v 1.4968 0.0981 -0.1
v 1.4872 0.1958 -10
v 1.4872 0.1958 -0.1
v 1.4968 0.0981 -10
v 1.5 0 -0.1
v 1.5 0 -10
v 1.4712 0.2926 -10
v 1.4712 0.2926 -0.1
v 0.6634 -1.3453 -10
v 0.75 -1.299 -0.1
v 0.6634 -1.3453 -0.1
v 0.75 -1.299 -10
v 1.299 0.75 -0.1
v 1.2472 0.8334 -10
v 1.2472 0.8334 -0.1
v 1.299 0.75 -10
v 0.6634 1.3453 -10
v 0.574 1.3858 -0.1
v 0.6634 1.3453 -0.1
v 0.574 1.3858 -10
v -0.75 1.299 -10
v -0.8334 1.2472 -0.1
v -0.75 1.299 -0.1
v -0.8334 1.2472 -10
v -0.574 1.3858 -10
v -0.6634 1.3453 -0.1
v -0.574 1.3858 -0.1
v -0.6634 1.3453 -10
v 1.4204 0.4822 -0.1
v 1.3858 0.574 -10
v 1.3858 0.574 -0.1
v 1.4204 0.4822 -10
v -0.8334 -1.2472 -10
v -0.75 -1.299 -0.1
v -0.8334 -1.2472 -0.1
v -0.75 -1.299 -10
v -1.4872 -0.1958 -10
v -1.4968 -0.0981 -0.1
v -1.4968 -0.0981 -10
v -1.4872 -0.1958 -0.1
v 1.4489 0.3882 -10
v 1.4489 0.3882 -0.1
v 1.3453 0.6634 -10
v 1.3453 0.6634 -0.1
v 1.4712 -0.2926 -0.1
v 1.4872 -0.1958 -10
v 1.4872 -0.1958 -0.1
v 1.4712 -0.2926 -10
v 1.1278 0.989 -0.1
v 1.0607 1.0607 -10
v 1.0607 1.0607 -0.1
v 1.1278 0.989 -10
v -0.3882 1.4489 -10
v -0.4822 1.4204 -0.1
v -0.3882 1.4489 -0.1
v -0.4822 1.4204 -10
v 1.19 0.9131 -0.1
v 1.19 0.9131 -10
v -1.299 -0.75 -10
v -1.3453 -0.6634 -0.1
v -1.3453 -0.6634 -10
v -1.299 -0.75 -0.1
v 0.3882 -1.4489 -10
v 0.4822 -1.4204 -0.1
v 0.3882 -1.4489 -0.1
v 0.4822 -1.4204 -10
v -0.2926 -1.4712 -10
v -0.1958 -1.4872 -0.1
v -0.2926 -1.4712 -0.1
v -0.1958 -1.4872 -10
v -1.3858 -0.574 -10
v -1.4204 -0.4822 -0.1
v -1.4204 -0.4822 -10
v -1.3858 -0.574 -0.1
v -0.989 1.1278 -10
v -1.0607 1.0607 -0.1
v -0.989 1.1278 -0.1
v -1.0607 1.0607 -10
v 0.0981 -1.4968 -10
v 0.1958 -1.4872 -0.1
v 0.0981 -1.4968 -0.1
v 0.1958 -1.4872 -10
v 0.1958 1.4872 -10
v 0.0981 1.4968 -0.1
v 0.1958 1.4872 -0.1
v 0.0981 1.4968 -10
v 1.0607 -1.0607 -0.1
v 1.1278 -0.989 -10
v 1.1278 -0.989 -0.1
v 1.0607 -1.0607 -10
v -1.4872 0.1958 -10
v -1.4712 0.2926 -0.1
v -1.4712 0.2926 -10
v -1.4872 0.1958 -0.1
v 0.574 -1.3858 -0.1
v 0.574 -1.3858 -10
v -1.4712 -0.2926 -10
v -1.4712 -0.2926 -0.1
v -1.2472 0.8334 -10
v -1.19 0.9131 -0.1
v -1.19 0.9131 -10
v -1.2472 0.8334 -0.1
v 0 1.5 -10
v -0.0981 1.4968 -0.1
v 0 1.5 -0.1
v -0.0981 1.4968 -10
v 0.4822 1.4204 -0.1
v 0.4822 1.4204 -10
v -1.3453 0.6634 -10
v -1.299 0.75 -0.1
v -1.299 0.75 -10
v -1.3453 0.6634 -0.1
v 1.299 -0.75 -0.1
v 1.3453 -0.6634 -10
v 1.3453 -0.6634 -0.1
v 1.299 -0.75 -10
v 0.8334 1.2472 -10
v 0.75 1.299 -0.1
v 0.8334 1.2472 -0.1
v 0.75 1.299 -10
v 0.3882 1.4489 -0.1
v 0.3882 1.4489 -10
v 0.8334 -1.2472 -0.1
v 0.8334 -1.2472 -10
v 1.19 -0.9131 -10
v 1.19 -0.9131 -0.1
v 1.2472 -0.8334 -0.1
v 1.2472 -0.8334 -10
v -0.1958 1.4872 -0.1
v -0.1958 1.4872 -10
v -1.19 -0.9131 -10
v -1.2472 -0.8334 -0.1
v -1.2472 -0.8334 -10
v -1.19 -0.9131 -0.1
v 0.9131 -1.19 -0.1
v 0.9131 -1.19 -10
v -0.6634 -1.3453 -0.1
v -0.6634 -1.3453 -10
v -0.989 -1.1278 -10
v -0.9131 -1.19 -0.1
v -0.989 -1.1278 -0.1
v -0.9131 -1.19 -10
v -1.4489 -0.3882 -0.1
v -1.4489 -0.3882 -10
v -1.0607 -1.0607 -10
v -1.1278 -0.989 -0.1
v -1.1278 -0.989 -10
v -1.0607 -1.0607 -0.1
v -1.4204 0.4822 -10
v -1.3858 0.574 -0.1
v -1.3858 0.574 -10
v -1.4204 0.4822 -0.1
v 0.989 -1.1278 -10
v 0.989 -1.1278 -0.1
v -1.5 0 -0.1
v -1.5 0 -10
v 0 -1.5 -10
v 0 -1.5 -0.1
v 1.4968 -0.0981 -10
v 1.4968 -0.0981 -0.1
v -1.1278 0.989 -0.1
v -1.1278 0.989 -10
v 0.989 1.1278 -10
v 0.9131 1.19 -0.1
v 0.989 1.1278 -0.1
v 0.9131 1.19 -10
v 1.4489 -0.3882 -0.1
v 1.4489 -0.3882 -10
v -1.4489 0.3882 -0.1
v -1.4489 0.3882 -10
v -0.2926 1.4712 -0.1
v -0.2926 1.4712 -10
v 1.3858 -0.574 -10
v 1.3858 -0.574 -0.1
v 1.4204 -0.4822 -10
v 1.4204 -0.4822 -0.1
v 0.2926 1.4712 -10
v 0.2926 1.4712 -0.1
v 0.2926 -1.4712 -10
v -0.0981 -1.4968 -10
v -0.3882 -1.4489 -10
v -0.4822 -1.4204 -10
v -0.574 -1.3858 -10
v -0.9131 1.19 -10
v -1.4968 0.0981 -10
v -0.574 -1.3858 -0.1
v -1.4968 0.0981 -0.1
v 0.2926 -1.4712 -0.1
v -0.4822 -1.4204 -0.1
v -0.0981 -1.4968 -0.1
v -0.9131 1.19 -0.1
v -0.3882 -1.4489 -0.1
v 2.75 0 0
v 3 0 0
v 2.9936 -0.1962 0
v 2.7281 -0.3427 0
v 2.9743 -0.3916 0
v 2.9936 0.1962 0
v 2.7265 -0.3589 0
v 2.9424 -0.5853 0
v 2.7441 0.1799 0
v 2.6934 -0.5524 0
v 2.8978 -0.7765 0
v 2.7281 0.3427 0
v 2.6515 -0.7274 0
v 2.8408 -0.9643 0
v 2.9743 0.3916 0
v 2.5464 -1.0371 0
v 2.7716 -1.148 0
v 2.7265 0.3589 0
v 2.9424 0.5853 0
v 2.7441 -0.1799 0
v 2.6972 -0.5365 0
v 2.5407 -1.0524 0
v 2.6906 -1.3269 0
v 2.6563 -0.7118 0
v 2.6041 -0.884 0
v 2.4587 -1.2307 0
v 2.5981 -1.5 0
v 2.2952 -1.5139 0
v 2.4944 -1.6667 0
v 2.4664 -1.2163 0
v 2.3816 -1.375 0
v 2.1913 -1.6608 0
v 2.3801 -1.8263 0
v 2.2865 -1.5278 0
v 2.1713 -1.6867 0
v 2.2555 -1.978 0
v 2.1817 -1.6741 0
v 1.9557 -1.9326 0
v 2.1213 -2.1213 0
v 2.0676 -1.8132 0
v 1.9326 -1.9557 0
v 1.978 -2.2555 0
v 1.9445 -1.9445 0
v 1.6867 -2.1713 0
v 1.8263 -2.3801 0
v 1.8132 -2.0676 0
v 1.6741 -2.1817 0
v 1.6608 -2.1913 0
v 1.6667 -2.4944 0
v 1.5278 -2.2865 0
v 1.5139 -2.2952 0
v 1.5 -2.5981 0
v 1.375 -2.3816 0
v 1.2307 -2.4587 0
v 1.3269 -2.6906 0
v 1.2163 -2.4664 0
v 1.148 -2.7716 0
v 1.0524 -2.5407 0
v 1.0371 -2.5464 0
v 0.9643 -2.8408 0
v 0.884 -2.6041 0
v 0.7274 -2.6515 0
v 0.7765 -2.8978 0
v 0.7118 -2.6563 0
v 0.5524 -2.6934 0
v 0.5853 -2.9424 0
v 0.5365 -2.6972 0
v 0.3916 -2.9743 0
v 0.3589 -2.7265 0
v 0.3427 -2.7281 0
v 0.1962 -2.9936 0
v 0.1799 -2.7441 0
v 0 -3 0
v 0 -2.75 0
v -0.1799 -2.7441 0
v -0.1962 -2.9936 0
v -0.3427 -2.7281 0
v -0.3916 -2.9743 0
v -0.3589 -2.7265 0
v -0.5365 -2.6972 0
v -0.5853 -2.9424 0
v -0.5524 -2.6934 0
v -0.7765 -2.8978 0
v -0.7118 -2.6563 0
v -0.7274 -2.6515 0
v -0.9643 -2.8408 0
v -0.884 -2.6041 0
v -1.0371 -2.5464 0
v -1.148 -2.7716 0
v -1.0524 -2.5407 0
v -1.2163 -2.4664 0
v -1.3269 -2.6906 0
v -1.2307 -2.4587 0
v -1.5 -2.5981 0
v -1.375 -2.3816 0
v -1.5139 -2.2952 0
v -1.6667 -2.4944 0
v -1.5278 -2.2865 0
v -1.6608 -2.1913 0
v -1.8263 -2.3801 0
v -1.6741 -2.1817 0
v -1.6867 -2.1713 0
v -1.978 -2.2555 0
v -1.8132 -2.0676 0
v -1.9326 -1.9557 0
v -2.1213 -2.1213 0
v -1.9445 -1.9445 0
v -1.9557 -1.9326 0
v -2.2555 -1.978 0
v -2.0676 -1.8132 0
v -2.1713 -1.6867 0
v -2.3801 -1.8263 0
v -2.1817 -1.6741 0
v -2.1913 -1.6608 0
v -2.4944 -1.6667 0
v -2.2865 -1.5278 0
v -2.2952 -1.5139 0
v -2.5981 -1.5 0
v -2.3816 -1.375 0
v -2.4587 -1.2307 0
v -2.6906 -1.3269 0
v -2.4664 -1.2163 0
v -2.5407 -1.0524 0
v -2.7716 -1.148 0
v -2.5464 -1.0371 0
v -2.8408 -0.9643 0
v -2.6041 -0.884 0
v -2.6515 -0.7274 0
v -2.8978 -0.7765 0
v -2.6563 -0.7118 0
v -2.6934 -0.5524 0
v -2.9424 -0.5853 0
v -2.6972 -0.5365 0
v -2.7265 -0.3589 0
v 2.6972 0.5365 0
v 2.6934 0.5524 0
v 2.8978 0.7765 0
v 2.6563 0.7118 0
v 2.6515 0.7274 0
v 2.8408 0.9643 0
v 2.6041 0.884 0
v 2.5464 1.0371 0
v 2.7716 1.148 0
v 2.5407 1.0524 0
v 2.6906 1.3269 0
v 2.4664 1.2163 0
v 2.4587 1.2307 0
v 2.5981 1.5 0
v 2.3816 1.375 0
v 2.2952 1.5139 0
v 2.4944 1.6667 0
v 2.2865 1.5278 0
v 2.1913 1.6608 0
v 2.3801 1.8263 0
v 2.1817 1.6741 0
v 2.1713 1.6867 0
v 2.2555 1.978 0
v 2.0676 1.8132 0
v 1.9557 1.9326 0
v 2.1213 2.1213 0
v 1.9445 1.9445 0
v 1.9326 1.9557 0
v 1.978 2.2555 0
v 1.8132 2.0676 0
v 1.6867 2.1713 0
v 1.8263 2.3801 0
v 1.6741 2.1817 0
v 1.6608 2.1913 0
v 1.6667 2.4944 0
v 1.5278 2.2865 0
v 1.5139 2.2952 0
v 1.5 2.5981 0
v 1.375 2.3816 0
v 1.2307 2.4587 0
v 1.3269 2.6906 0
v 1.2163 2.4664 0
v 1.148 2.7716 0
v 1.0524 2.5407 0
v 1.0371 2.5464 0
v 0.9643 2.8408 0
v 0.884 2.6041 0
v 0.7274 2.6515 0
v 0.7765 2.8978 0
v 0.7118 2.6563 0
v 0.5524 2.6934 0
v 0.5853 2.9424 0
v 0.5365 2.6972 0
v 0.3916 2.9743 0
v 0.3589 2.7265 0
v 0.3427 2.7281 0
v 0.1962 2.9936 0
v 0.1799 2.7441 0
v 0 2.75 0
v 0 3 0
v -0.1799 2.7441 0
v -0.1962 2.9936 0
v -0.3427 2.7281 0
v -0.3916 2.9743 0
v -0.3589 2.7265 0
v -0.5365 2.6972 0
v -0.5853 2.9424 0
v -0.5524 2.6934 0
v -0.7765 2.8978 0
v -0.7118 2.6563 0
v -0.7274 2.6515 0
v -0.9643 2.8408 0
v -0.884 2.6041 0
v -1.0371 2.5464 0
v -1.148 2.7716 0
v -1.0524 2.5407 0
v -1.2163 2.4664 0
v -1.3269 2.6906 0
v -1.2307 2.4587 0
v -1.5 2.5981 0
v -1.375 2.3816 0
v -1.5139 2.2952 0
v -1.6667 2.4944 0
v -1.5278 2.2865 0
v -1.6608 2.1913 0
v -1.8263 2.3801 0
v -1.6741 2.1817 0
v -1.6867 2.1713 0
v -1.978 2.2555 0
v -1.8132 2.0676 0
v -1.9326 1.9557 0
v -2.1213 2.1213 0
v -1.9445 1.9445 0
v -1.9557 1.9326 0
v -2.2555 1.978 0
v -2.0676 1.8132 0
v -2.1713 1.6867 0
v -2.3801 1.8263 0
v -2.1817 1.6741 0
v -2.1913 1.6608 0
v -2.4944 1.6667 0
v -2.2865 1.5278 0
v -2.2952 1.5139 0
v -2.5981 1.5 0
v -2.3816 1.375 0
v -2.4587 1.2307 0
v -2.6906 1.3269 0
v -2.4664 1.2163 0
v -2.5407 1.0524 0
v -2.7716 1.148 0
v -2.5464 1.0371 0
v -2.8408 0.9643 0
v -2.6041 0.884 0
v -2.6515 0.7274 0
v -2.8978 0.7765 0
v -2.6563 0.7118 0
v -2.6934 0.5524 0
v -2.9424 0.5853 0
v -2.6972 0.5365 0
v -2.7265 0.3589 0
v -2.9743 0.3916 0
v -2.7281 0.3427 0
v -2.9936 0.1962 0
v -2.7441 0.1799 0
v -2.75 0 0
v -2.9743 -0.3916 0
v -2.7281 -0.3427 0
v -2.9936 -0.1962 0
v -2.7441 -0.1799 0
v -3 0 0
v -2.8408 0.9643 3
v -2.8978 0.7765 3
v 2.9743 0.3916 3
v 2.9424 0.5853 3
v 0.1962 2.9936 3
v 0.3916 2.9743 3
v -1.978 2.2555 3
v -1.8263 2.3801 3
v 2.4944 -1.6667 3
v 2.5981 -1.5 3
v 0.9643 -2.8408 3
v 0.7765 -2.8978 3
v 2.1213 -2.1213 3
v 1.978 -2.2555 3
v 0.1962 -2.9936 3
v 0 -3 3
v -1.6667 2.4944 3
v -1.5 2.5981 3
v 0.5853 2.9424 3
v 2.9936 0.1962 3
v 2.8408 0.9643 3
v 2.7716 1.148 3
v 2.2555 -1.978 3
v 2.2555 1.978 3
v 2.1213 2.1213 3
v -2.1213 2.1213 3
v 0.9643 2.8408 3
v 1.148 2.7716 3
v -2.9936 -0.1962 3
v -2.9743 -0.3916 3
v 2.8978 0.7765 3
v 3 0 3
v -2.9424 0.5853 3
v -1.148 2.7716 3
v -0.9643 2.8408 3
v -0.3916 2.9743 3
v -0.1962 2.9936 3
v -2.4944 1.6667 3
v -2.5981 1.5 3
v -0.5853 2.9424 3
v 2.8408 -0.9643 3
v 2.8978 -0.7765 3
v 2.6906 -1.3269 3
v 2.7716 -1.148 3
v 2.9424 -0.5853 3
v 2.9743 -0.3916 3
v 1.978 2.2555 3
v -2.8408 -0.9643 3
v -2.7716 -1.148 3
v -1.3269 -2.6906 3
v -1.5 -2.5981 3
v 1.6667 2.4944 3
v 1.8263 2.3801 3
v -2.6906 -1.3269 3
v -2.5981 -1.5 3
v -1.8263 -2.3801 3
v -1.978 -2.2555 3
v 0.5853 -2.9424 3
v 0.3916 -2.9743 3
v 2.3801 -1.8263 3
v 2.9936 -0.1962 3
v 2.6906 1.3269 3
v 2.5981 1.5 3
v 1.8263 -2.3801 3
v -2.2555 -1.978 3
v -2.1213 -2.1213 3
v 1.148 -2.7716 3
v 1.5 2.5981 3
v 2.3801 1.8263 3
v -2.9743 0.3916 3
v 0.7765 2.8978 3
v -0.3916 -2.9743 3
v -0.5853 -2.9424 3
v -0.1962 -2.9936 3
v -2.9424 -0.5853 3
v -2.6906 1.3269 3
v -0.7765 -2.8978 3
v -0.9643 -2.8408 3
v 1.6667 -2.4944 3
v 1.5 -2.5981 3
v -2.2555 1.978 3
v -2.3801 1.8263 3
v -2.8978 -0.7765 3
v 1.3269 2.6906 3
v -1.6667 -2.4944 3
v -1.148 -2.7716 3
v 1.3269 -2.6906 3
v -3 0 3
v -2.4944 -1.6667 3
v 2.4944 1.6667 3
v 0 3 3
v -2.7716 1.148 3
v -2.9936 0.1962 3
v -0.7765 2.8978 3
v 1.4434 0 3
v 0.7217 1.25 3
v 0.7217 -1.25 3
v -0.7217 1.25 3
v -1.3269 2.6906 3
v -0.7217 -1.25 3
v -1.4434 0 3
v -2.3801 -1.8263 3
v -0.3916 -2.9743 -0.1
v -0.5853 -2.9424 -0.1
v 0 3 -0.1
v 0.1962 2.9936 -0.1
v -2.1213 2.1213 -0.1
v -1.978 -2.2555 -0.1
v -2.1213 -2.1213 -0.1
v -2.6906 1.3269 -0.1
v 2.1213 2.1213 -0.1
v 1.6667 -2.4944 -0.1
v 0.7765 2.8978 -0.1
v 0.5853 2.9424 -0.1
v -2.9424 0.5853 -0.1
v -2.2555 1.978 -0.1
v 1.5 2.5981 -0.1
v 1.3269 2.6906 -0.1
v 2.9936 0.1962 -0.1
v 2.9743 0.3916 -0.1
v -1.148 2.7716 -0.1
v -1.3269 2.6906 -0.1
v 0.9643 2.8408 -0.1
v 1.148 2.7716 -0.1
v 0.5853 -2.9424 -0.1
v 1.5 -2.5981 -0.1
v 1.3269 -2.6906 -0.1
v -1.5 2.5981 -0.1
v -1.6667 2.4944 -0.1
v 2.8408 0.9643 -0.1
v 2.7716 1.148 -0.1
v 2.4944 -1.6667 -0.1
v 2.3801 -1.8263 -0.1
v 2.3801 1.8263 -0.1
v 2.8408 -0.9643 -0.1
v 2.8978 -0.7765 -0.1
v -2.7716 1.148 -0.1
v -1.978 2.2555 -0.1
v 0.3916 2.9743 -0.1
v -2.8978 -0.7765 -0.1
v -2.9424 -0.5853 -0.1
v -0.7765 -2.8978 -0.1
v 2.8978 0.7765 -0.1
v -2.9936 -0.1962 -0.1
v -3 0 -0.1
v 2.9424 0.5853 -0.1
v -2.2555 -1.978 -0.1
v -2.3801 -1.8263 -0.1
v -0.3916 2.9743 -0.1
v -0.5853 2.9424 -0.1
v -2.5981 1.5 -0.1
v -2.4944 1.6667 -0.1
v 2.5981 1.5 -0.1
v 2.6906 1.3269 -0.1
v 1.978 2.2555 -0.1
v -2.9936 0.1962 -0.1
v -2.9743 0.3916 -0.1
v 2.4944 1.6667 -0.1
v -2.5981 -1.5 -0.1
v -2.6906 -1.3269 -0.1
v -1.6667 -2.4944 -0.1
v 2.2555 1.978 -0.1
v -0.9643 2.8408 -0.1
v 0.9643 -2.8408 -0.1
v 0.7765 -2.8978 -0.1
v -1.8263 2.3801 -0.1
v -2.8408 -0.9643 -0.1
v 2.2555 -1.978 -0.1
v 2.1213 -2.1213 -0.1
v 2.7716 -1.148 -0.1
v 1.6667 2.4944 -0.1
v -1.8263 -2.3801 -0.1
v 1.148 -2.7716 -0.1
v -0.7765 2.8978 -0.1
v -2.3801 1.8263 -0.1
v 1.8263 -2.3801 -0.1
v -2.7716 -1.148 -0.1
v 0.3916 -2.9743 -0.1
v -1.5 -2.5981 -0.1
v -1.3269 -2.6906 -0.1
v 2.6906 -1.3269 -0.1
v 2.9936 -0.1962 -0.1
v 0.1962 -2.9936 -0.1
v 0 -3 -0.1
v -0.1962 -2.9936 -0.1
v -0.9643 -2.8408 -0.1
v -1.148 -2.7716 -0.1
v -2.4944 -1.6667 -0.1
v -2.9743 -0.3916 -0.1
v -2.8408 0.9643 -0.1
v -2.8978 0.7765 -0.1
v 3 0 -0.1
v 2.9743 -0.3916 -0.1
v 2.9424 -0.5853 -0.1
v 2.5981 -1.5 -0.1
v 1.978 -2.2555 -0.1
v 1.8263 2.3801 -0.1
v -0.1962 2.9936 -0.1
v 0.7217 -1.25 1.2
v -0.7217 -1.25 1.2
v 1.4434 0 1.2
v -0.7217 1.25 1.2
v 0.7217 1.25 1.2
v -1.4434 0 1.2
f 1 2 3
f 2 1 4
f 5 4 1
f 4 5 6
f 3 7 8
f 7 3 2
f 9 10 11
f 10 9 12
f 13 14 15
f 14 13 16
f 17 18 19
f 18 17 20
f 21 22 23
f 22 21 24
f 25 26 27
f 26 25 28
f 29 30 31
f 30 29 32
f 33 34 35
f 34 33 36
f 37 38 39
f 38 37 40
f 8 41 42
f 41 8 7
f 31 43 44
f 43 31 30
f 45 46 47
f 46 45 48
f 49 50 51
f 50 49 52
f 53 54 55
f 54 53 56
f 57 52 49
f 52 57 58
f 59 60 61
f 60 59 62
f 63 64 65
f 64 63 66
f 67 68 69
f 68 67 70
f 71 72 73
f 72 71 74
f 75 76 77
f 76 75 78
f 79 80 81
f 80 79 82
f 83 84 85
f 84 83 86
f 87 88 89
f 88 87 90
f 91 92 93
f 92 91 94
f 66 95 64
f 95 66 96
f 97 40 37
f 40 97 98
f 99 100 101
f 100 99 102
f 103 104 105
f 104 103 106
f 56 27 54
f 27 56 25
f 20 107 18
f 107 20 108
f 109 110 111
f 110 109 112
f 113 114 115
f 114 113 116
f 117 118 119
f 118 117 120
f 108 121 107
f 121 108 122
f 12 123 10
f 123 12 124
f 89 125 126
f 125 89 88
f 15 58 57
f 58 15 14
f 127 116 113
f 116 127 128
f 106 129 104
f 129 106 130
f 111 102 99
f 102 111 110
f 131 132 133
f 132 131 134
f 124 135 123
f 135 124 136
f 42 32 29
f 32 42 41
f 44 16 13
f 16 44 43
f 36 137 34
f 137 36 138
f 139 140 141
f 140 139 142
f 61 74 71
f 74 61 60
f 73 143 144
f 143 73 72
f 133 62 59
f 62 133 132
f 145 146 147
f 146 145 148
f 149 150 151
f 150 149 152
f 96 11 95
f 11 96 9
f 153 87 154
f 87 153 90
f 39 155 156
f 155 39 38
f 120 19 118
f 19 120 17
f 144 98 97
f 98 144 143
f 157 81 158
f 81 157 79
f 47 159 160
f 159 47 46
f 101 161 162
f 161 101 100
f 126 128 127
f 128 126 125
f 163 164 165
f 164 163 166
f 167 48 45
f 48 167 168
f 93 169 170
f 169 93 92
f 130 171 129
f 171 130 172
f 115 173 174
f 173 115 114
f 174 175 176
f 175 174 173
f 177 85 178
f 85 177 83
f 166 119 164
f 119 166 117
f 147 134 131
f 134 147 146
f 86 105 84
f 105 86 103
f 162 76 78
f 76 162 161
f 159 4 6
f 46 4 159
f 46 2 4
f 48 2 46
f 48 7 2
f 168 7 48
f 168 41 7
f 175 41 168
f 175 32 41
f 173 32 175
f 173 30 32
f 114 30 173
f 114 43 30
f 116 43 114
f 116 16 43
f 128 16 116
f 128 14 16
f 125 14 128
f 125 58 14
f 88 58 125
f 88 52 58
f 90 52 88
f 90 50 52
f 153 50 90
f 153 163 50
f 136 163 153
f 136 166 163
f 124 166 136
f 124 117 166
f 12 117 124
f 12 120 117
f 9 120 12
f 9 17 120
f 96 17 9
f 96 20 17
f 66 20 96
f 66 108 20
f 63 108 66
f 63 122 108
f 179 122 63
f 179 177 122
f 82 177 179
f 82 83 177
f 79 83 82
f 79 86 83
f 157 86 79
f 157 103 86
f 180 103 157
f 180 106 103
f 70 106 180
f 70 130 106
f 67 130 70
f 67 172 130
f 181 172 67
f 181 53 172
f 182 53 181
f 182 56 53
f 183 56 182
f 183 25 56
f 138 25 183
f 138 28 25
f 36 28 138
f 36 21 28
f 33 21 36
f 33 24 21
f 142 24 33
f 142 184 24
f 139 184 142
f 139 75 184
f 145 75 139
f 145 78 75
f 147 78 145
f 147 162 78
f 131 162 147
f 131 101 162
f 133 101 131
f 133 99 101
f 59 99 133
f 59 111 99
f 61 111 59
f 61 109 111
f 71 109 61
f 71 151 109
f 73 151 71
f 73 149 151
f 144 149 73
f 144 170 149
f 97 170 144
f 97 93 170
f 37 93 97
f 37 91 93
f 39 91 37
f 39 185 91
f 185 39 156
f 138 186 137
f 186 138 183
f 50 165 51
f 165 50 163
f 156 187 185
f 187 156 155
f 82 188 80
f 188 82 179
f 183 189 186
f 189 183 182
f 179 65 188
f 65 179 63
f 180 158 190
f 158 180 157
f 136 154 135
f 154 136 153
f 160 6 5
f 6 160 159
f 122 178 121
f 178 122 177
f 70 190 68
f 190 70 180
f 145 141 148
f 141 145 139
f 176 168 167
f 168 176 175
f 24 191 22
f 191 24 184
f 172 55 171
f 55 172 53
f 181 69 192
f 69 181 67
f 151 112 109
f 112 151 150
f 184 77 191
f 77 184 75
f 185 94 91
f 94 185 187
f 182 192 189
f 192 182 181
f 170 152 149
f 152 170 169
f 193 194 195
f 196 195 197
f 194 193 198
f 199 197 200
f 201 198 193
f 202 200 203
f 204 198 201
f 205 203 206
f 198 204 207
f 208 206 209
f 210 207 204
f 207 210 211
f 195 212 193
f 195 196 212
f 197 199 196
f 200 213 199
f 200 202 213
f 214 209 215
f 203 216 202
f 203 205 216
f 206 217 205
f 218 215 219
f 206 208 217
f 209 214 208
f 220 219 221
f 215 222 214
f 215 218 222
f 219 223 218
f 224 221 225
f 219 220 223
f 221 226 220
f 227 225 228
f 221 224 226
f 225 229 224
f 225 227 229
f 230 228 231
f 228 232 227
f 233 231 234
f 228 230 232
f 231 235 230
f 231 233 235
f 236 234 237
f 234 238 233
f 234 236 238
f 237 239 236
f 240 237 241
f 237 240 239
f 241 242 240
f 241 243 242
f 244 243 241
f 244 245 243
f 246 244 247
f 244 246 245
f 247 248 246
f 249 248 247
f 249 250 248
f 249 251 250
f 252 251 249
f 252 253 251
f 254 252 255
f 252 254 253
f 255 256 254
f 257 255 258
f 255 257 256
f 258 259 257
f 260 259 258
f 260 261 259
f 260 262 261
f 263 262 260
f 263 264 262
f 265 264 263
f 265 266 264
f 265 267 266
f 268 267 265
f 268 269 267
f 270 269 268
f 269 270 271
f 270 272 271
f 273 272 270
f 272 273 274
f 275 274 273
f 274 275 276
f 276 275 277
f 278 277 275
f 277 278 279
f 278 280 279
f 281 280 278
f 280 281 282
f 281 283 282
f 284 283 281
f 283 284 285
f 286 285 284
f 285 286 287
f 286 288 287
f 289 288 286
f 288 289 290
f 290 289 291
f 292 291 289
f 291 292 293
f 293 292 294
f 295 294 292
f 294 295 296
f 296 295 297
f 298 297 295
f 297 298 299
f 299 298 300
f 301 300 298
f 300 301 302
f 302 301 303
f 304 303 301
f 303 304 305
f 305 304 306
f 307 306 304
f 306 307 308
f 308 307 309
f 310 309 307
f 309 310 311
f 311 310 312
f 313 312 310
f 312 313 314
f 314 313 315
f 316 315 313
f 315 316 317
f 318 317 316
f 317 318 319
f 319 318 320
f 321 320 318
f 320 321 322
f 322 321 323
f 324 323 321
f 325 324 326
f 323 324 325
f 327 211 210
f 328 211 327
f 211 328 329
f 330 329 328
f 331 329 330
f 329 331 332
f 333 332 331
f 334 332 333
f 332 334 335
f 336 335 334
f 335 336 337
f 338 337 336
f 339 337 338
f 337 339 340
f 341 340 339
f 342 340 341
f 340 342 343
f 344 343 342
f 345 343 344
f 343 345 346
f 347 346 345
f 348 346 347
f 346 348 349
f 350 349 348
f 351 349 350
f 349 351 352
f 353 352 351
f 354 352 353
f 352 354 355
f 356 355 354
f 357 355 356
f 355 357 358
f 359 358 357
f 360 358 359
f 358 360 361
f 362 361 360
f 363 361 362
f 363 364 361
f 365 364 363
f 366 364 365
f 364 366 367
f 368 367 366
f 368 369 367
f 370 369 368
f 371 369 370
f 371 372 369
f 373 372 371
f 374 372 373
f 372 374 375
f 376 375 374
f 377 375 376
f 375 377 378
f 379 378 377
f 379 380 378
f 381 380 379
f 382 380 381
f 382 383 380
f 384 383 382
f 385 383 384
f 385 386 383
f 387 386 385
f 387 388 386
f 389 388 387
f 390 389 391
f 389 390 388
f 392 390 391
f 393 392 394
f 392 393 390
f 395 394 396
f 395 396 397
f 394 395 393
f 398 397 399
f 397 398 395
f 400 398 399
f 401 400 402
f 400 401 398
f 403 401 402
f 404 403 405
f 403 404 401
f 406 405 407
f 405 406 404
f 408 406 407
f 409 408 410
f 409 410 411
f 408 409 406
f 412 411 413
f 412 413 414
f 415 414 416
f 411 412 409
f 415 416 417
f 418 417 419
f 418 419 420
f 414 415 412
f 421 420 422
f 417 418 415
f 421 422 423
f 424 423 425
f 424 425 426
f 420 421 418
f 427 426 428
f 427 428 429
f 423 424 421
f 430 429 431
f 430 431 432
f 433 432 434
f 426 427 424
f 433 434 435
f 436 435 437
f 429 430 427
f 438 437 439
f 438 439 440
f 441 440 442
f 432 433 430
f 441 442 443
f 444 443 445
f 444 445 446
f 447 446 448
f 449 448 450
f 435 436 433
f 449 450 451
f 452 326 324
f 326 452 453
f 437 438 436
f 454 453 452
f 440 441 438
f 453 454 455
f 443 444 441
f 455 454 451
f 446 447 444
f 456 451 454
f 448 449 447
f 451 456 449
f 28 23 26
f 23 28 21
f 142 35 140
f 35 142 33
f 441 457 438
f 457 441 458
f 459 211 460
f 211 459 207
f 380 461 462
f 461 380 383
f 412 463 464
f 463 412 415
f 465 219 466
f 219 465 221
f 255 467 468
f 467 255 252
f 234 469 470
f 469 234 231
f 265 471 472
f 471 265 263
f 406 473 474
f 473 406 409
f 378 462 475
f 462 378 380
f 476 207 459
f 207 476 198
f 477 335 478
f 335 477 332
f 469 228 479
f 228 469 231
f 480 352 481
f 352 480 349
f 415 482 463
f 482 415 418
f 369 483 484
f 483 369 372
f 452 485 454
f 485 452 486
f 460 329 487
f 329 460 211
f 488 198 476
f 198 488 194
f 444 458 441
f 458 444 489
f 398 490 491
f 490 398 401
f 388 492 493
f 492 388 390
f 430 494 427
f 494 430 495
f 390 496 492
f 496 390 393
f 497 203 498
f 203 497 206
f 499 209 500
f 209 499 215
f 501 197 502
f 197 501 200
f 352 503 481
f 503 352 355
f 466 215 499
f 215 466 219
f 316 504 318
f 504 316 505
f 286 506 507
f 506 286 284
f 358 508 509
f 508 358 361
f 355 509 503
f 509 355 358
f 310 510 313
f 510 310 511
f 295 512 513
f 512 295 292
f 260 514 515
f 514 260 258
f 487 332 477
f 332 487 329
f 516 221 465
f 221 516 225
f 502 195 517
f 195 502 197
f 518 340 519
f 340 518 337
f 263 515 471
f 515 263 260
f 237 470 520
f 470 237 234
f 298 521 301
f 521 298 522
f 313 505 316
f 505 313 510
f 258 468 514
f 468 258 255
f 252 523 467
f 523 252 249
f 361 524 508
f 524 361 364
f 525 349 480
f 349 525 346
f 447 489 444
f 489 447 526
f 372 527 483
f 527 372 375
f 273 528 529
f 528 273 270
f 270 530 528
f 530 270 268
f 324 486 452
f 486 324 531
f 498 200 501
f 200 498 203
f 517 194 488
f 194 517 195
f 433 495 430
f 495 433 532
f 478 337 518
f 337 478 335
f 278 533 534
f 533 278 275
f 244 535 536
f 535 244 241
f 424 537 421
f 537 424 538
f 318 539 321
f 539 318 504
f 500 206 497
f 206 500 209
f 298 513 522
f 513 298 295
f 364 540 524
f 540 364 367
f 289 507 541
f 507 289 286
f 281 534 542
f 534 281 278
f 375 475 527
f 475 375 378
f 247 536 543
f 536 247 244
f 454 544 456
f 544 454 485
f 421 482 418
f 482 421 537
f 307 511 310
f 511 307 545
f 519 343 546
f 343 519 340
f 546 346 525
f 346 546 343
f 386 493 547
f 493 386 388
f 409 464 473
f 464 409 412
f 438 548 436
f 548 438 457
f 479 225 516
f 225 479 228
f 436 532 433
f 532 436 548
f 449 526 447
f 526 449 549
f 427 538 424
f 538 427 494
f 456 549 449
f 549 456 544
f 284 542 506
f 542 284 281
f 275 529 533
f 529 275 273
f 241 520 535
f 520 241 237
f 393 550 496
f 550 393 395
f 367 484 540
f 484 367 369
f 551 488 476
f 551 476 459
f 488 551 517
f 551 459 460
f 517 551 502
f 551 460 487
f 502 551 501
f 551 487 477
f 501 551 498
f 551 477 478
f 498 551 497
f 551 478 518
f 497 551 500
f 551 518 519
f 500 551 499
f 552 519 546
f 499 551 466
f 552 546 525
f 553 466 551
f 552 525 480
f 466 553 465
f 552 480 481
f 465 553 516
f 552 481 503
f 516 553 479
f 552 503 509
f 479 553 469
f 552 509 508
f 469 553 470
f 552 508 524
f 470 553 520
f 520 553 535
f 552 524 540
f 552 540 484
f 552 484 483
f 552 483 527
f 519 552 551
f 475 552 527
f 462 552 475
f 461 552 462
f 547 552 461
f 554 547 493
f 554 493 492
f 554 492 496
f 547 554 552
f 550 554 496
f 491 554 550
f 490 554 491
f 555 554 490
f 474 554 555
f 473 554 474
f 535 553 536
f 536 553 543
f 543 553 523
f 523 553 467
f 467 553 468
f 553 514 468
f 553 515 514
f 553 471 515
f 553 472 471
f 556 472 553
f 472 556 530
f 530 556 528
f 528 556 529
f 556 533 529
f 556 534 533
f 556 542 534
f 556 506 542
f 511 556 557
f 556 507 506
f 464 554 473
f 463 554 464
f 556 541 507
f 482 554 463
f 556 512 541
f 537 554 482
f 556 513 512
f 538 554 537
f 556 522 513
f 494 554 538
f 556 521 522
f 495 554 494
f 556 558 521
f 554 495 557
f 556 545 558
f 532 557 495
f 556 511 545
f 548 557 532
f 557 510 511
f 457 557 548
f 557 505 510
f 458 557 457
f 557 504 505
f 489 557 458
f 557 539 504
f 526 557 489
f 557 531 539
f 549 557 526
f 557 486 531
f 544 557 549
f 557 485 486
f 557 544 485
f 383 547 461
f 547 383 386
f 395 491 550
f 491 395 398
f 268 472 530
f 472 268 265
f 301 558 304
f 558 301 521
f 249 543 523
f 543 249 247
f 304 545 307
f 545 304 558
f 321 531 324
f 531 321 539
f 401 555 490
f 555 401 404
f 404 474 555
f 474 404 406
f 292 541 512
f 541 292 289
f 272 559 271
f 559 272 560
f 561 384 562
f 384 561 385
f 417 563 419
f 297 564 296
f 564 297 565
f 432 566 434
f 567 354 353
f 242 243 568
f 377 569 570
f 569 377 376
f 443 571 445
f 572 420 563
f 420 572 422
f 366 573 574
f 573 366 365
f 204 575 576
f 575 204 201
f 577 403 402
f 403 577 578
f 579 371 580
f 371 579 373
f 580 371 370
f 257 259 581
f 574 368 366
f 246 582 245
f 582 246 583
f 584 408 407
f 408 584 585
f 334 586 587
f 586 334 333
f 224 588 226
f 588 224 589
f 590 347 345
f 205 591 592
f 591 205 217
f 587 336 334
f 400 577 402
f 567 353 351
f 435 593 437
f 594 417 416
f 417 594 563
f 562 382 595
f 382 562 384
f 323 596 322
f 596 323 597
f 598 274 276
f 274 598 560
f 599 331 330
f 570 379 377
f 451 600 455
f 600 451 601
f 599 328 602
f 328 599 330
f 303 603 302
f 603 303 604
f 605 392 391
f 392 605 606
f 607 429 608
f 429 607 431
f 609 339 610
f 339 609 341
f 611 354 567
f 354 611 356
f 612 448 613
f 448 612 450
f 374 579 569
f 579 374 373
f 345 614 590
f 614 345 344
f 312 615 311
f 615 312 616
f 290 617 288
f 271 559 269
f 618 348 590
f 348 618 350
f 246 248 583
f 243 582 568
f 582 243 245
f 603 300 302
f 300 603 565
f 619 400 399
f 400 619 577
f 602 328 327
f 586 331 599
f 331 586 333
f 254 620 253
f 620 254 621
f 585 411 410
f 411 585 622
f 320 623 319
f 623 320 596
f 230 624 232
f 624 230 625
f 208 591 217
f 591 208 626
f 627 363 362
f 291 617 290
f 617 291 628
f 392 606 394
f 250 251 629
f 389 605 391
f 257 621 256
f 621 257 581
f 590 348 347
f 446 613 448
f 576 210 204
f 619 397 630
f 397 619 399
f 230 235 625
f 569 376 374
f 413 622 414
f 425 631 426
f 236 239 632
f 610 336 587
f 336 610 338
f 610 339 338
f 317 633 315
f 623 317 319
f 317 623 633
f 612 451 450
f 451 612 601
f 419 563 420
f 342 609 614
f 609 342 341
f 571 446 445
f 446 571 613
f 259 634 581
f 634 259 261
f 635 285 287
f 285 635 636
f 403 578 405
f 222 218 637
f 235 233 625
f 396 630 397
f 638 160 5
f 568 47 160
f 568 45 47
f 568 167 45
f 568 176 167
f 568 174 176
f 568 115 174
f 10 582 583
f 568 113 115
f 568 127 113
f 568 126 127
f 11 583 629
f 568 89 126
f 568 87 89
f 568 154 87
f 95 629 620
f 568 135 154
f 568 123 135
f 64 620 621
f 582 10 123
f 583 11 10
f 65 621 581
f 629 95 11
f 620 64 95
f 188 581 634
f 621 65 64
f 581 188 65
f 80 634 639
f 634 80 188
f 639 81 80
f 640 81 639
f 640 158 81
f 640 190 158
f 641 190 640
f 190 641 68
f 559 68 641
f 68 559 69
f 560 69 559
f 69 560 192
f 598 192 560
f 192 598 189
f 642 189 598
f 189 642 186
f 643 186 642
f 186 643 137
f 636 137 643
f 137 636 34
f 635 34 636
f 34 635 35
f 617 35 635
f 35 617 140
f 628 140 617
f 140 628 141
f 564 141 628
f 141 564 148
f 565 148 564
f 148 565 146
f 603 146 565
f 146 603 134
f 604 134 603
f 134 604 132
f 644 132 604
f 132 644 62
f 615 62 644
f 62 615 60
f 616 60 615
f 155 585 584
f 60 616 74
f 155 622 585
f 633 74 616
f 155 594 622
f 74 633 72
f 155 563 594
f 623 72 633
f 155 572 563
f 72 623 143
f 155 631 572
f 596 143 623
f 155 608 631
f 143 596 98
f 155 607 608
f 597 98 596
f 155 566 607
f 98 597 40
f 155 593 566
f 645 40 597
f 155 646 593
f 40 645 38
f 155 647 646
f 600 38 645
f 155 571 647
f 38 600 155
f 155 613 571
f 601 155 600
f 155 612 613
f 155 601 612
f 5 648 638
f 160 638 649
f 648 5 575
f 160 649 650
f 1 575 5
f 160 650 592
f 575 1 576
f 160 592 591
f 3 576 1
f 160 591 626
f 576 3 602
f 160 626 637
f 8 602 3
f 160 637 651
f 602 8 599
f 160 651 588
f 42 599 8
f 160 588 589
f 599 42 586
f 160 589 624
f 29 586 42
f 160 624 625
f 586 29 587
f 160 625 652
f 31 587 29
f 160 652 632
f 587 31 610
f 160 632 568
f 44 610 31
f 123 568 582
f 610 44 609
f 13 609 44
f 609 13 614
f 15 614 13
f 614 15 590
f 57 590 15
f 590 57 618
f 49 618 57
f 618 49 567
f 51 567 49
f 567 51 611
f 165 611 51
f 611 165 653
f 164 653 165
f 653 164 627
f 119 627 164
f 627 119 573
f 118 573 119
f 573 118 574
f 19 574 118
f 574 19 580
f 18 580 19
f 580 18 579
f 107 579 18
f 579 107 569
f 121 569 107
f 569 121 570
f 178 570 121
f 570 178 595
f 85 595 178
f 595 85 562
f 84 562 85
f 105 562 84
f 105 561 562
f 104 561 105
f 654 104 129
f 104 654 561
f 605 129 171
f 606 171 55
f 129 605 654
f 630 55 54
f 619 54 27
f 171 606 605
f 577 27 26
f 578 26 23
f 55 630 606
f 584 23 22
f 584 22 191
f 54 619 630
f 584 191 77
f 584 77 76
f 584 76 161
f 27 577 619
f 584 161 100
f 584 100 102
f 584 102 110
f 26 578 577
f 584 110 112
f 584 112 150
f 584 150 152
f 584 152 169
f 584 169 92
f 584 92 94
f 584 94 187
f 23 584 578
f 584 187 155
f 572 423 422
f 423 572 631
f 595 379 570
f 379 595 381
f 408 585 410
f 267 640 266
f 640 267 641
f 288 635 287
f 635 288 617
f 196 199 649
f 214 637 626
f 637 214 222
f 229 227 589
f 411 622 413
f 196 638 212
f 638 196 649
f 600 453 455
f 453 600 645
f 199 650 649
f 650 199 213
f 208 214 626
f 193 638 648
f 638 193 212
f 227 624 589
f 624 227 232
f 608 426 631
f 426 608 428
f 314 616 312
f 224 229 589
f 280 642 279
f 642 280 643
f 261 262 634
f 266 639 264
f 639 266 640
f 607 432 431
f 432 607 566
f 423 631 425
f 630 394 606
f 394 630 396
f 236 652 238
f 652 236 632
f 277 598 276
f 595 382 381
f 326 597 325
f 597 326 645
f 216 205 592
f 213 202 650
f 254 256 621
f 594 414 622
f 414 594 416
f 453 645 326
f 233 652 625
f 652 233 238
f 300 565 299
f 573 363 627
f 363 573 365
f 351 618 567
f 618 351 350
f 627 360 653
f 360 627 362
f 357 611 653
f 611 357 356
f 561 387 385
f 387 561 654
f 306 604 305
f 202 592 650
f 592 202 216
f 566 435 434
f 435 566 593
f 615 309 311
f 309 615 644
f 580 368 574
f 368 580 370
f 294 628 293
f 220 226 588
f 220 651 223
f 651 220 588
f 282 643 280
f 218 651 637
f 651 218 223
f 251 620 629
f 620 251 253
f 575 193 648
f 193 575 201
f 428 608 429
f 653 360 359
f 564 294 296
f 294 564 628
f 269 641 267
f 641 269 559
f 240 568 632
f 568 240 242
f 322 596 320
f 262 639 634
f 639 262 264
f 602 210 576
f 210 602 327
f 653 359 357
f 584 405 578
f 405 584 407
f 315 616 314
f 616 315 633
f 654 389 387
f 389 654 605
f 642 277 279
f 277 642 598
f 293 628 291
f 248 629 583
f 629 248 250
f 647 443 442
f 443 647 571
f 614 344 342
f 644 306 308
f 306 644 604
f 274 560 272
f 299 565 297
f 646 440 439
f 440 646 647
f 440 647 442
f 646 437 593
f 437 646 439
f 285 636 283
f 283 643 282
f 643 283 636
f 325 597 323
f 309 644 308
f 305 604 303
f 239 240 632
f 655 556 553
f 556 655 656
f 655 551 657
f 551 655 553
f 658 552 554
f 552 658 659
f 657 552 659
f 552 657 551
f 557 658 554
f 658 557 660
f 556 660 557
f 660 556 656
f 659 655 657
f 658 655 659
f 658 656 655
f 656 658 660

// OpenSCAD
// Socket Head Cap Screw (plain) - M3 x 10 with 6mm head OD
// One connected solid, no washer/flange, with hex socket recess.

thread_diameter_mm = 3.0;
length_mm          = 10.0;   // shank length under head
head_diameter_mm   = 6.0;
head_height_mm     = 3.0;

socket_af_mm       = 2.5;    // across flats
socket_depth_mm    = 1.6;

head_to_shank_chamfer_mm = 0.6;
shaft_tip_chamfer_mm     = 0.6;

overlap_mm = 0.2;

$fn = 96;

module socket_head_cap_screw() {
  shank_r = thread_diameter_mm/2;
  head_r  = head_diameter_mm/2;

  // Place underside of head at z=0, shank extends to -length_mm, head to +head_height_mm
  difference() {
    union() {
      // Shank
      translate([0, 0, -length_mm/2])
        cylinder(r=shank_r, h=length_mm, center=true);

      // Head
      translate([0, 0, head_height_mm/2])
        cylinder(r=head_r, h=head_height_mm, center=true);

      // Head-to-shank chamfer (connects head underside to shank)
      translate([0, 0, head_to_shank_chamfer_mm/2 - overlap_mm/2])
        cylinder(r1=head_r, r2=shank_r, h=head_to_shank_chamfer_mm, center=true);

      // Tip chamfer
      translate([0, 0, -length_mm + shaft_tip_chamfer_mm/2])
        cylinder(r1=shank_r, r2=max(0.01, shank_r - 0.35), h=shaft_tip_chamfer_mm, center=true);
    }

    // Hex socket recess (cut into top of head)
    translate([0, 0, head_height_mm - socket_depth_mm/2])
      cylinder(r=(socket_af_mm/2)/cos(30), h=socket_depth_mm + overlap_mm*2, center=true, $fn=6);
  }
}

socket_head_cap_screw();
